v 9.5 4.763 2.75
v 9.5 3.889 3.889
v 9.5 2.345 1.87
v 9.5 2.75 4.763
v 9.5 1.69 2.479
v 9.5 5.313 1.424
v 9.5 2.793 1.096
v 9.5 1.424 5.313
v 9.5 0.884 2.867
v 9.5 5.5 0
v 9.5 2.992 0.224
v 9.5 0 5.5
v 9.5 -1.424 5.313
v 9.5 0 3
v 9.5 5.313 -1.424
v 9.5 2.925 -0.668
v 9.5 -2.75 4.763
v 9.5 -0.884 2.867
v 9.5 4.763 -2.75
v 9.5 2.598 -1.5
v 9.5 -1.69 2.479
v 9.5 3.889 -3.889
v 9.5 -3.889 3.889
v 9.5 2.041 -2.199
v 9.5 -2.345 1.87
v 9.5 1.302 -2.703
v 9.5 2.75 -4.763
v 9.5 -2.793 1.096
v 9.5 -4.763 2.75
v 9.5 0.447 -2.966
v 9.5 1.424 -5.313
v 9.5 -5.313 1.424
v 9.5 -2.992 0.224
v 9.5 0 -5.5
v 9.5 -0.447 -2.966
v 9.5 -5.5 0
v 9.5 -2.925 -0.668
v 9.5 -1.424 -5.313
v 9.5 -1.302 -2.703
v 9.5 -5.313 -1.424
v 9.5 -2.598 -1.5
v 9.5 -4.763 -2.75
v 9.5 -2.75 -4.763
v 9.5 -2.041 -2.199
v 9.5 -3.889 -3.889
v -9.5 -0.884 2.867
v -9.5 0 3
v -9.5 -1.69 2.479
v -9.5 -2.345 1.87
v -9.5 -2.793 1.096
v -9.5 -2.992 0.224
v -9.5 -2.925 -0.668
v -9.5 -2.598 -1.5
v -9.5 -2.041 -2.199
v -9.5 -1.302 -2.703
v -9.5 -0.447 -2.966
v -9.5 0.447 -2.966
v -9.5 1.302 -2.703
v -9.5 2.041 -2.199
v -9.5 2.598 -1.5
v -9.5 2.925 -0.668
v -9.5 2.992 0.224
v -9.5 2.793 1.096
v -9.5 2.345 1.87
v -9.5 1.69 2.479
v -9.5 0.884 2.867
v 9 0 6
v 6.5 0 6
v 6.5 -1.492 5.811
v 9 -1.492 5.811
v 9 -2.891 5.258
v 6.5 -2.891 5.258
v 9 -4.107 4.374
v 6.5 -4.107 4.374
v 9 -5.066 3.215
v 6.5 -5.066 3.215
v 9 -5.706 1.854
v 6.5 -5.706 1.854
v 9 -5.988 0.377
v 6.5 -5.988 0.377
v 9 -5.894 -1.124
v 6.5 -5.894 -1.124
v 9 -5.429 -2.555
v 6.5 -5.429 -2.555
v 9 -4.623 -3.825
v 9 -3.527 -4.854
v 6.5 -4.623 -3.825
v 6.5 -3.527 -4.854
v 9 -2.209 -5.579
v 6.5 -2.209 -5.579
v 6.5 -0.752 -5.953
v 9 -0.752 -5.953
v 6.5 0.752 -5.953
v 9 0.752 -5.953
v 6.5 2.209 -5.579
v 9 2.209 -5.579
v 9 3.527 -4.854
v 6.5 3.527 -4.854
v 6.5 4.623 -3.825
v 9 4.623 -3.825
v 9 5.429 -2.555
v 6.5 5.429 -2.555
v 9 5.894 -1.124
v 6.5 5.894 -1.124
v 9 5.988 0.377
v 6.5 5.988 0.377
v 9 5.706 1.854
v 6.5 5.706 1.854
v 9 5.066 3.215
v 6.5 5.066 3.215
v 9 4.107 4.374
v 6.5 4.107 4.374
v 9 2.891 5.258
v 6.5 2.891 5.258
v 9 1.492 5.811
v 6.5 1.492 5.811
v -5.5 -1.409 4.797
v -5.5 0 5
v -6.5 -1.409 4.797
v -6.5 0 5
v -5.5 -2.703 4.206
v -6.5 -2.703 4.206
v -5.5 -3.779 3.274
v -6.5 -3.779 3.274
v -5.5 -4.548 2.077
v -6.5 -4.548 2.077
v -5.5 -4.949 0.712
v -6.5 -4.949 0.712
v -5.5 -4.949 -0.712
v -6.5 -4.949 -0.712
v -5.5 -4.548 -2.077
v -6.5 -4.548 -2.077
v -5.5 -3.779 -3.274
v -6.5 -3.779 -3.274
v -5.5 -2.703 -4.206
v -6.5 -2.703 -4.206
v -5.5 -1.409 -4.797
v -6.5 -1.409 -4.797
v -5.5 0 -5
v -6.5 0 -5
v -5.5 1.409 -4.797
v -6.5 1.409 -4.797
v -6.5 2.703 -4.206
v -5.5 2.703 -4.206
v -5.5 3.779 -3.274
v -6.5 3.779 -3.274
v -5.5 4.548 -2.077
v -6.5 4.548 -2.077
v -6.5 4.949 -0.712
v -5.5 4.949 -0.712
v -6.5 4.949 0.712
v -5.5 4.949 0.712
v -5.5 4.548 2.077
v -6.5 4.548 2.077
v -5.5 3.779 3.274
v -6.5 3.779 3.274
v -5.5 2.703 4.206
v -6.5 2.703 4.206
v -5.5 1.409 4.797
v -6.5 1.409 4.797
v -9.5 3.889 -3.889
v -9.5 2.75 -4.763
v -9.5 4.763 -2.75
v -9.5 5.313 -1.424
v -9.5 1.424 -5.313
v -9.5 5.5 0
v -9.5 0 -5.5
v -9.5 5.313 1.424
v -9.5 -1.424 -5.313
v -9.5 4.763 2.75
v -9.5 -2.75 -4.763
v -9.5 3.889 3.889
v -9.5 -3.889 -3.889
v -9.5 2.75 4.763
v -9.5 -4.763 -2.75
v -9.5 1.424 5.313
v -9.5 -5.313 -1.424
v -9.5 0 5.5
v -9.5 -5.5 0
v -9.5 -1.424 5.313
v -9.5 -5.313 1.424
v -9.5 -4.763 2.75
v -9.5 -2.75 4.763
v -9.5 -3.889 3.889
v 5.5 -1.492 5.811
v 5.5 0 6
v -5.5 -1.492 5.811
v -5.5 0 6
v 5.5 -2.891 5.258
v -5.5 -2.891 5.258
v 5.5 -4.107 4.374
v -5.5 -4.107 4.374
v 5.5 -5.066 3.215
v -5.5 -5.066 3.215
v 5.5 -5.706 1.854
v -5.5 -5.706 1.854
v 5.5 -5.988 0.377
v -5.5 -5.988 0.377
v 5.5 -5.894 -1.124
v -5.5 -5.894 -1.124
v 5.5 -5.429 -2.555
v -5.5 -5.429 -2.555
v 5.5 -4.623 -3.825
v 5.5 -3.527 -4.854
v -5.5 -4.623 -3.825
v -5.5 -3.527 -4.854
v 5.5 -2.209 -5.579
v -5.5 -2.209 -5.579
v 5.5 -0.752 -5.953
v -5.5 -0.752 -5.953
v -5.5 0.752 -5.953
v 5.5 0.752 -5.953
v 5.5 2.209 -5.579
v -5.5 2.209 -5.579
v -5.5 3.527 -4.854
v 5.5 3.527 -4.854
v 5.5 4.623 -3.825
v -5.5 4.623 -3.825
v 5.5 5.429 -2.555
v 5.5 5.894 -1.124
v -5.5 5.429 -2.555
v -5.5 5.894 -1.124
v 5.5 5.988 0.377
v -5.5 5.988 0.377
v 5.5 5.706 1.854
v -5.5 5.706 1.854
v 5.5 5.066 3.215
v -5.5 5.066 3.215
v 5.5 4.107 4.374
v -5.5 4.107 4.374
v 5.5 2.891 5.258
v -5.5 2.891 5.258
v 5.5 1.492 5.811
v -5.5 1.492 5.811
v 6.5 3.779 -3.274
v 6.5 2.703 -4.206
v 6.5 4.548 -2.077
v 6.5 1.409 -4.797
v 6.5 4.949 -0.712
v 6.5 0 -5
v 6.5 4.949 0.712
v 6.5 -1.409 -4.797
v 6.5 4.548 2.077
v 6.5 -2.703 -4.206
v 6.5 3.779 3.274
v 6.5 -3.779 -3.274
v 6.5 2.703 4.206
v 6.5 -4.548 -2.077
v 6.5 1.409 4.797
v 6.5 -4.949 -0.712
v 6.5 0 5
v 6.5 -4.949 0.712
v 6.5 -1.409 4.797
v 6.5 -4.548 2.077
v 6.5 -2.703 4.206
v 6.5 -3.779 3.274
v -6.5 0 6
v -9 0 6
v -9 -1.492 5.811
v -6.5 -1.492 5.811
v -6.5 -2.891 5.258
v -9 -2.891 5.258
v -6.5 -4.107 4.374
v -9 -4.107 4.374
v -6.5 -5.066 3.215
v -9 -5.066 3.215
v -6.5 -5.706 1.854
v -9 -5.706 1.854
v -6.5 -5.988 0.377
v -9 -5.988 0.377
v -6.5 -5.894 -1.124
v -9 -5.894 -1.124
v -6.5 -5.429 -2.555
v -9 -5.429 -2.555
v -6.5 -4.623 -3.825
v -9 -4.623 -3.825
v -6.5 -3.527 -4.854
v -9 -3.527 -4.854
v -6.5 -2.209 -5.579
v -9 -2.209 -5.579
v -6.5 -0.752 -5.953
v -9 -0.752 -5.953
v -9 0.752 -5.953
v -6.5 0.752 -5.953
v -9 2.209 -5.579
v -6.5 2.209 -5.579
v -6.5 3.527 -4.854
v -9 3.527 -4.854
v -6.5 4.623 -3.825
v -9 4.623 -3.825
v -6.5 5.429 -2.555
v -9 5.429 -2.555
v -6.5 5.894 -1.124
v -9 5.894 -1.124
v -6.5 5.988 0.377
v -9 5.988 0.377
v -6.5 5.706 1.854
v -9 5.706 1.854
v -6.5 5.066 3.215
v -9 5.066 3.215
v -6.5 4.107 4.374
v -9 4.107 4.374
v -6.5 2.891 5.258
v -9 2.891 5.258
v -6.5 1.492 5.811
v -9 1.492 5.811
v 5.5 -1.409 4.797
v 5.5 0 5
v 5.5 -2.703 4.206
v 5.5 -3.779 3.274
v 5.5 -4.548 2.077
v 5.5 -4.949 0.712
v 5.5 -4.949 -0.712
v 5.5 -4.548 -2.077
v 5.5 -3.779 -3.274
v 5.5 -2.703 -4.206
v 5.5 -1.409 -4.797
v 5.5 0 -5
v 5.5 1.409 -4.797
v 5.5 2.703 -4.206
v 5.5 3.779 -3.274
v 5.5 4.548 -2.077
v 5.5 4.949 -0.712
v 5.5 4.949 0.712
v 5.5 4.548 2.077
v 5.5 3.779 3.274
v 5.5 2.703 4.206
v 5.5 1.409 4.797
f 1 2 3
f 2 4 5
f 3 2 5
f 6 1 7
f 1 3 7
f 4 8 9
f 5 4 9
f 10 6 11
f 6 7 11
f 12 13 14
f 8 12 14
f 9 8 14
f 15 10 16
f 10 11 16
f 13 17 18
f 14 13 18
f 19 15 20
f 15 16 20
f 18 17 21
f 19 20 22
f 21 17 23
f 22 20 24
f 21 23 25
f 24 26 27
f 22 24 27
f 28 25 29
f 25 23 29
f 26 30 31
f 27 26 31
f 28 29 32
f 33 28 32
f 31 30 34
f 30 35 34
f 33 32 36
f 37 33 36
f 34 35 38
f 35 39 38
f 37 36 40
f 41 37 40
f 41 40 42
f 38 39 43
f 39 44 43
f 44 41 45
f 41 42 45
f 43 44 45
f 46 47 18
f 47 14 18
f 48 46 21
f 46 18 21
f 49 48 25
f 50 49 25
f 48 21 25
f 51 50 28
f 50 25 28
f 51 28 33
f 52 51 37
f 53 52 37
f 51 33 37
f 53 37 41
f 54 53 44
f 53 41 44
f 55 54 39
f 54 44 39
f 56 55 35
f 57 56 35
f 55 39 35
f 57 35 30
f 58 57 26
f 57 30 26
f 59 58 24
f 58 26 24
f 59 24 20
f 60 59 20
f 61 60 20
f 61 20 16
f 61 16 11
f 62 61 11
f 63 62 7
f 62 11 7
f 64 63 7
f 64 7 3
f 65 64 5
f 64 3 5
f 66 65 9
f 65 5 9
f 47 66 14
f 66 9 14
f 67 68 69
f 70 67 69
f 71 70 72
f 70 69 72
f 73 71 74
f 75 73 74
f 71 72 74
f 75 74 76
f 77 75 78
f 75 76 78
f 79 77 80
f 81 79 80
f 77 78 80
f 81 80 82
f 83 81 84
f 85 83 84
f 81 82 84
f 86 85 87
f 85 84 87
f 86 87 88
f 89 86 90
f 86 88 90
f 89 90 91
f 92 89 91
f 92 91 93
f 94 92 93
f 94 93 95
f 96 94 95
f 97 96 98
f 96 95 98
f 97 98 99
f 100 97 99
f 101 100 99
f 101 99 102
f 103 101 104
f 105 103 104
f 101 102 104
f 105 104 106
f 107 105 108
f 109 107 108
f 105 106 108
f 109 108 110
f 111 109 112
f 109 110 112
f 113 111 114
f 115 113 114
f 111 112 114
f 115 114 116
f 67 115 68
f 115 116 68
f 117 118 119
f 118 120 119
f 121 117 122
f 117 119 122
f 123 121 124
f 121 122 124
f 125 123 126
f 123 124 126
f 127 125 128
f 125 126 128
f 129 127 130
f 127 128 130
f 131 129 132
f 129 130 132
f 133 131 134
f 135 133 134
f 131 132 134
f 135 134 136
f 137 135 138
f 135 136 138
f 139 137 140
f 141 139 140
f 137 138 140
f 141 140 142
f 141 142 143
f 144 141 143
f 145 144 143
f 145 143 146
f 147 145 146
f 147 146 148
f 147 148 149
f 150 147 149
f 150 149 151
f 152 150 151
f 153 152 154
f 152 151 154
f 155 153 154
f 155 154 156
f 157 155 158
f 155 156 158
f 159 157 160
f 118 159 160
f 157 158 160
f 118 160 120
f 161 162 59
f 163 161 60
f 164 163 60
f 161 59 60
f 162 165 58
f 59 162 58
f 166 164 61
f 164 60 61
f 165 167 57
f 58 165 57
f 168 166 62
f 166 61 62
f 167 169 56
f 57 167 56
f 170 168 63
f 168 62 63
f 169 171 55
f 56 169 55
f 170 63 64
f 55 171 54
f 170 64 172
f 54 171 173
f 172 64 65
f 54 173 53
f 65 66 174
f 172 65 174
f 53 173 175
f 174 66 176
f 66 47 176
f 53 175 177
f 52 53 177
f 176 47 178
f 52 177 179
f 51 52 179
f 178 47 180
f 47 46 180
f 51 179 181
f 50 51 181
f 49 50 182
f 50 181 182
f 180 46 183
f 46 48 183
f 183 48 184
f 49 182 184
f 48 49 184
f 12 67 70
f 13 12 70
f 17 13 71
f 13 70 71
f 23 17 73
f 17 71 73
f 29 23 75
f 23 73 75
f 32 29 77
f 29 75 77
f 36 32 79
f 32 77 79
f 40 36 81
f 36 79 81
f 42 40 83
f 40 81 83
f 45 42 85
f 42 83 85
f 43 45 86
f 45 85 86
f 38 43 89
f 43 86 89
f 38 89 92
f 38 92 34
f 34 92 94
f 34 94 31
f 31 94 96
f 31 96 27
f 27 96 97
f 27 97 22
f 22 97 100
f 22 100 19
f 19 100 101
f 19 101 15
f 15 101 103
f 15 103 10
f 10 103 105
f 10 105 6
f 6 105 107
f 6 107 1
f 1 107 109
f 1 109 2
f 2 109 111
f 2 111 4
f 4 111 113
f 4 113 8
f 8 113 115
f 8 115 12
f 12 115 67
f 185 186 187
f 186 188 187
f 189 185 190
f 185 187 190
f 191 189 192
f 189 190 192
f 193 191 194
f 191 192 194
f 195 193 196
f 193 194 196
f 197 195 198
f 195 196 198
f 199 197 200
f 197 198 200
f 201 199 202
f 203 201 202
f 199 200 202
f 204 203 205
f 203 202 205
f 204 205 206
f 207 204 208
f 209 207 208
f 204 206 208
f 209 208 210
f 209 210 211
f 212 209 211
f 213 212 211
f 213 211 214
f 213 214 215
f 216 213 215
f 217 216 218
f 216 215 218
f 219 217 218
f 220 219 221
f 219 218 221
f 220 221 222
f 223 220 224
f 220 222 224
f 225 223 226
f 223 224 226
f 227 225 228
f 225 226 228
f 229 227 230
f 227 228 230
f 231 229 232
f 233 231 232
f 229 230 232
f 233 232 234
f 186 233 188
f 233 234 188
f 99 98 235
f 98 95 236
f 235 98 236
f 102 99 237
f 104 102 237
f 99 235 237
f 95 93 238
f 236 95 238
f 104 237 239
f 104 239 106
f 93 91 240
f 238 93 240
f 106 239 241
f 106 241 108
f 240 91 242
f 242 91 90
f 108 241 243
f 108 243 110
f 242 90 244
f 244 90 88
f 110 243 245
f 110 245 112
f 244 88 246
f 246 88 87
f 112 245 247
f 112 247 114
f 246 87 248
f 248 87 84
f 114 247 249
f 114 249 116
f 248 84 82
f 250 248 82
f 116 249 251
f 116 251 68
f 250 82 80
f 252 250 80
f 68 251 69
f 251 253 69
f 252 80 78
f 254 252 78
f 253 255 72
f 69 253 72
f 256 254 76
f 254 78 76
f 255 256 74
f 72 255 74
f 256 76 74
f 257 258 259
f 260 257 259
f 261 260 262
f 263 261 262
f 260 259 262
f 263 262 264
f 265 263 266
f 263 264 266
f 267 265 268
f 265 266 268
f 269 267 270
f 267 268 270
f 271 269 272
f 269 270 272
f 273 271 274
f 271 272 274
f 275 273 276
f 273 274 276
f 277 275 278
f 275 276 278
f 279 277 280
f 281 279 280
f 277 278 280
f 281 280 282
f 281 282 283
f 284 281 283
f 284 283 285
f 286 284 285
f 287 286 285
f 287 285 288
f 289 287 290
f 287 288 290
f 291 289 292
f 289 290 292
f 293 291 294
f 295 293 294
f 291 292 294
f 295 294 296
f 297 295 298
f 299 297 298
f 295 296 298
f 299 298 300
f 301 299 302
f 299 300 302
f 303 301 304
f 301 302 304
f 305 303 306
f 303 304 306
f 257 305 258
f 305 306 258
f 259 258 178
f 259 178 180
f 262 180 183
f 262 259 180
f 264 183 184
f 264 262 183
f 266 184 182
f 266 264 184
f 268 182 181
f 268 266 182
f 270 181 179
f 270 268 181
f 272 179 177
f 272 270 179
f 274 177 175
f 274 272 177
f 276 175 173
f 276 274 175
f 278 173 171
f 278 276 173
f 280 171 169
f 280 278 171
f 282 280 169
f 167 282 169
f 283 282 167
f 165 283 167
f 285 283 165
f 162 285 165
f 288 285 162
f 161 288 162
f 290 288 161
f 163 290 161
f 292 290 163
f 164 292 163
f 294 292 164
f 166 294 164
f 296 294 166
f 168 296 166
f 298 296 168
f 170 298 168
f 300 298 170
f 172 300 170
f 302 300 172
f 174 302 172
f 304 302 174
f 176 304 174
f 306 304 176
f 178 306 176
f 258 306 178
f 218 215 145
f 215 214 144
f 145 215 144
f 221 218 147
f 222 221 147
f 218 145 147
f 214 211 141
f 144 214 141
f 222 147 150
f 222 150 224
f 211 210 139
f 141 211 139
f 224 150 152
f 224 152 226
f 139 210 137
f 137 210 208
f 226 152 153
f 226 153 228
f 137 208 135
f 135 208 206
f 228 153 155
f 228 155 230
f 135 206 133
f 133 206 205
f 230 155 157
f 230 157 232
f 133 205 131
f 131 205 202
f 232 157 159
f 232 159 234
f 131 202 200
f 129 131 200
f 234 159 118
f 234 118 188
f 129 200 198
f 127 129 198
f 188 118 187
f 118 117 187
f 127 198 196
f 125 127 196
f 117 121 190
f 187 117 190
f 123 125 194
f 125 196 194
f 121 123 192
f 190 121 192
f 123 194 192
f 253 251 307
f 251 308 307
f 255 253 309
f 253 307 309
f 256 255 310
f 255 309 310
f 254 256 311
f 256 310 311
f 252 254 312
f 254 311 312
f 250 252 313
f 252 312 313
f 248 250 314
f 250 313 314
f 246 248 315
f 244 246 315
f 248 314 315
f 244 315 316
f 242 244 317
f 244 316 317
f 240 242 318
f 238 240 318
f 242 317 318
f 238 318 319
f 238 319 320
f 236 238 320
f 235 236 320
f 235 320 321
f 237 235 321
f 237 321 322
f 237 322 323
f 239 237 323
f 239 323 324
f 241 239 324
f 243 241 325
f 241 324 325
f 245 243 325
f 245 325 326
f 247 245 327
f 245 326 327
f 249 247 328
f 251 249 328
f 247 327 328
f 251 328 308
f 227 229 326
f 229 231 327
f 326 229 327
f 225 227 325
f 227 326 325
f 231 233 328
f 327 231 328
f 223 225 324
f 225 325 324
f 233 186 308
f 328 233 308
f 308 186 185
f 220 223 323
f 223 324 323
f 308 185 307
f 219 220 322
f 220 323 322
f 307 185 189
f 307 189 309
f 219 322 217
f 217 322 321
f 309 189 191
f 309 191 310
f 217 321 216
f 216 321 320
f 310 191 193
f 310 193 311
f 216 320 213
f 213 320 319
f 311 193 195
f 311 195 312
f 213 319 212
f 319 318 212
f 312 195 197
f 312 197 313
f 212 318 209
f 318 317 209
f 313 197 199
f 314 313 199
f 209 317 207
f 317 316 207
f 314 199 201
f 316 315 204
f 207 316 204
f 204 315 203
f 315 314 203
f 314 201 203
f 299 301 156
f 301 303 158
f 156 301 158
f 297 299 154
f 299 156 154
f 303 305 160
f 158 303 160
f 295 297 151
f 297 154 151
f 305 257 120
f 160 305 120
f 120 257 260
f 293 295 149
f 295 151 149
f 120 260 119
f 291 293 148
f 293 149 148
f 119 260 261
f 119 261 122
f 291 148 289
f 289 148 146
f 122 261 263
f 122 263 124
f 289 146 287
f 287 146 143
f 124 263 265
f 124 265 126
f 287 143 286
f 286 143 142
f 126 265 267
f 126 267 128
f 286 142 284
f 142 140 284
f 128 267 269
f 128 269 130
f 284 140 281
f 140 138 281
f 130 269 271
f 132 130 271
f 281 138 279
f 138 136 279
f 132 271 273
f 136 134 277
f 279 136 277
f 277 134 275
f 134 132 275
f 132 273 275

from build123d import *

# Parameters (mm, degrees)
F2_SIZE = 0.5


with BuildPart() as f1:
    # F0 (on Front) → F1 (revolve)
    with BuildSketch(Plane.XZ):
        Polygon((-9.5, 6), (-9.5, 3), (9.5, 3), (9.5, 6), (6.5, 6), (6.5, 5), (5.5, 5), (5.5, 6), (0, 6), (-5.5, 6), (-5.5, 5), (-6.5, 5), (-6.5, 6), align=None)
    revolve(axis=Axis((6.664423, 0, 0), (1, 0, 0)))

    # F2
    f2_edges = [f1.edges().sort_by_distance(p)[0] for p in [
        (-9.5, 0, -6),
        (9.5, 0, -6),
    ]]
    chamfer(f2_edges, length=F2_SIZE)


solid = f1.part
